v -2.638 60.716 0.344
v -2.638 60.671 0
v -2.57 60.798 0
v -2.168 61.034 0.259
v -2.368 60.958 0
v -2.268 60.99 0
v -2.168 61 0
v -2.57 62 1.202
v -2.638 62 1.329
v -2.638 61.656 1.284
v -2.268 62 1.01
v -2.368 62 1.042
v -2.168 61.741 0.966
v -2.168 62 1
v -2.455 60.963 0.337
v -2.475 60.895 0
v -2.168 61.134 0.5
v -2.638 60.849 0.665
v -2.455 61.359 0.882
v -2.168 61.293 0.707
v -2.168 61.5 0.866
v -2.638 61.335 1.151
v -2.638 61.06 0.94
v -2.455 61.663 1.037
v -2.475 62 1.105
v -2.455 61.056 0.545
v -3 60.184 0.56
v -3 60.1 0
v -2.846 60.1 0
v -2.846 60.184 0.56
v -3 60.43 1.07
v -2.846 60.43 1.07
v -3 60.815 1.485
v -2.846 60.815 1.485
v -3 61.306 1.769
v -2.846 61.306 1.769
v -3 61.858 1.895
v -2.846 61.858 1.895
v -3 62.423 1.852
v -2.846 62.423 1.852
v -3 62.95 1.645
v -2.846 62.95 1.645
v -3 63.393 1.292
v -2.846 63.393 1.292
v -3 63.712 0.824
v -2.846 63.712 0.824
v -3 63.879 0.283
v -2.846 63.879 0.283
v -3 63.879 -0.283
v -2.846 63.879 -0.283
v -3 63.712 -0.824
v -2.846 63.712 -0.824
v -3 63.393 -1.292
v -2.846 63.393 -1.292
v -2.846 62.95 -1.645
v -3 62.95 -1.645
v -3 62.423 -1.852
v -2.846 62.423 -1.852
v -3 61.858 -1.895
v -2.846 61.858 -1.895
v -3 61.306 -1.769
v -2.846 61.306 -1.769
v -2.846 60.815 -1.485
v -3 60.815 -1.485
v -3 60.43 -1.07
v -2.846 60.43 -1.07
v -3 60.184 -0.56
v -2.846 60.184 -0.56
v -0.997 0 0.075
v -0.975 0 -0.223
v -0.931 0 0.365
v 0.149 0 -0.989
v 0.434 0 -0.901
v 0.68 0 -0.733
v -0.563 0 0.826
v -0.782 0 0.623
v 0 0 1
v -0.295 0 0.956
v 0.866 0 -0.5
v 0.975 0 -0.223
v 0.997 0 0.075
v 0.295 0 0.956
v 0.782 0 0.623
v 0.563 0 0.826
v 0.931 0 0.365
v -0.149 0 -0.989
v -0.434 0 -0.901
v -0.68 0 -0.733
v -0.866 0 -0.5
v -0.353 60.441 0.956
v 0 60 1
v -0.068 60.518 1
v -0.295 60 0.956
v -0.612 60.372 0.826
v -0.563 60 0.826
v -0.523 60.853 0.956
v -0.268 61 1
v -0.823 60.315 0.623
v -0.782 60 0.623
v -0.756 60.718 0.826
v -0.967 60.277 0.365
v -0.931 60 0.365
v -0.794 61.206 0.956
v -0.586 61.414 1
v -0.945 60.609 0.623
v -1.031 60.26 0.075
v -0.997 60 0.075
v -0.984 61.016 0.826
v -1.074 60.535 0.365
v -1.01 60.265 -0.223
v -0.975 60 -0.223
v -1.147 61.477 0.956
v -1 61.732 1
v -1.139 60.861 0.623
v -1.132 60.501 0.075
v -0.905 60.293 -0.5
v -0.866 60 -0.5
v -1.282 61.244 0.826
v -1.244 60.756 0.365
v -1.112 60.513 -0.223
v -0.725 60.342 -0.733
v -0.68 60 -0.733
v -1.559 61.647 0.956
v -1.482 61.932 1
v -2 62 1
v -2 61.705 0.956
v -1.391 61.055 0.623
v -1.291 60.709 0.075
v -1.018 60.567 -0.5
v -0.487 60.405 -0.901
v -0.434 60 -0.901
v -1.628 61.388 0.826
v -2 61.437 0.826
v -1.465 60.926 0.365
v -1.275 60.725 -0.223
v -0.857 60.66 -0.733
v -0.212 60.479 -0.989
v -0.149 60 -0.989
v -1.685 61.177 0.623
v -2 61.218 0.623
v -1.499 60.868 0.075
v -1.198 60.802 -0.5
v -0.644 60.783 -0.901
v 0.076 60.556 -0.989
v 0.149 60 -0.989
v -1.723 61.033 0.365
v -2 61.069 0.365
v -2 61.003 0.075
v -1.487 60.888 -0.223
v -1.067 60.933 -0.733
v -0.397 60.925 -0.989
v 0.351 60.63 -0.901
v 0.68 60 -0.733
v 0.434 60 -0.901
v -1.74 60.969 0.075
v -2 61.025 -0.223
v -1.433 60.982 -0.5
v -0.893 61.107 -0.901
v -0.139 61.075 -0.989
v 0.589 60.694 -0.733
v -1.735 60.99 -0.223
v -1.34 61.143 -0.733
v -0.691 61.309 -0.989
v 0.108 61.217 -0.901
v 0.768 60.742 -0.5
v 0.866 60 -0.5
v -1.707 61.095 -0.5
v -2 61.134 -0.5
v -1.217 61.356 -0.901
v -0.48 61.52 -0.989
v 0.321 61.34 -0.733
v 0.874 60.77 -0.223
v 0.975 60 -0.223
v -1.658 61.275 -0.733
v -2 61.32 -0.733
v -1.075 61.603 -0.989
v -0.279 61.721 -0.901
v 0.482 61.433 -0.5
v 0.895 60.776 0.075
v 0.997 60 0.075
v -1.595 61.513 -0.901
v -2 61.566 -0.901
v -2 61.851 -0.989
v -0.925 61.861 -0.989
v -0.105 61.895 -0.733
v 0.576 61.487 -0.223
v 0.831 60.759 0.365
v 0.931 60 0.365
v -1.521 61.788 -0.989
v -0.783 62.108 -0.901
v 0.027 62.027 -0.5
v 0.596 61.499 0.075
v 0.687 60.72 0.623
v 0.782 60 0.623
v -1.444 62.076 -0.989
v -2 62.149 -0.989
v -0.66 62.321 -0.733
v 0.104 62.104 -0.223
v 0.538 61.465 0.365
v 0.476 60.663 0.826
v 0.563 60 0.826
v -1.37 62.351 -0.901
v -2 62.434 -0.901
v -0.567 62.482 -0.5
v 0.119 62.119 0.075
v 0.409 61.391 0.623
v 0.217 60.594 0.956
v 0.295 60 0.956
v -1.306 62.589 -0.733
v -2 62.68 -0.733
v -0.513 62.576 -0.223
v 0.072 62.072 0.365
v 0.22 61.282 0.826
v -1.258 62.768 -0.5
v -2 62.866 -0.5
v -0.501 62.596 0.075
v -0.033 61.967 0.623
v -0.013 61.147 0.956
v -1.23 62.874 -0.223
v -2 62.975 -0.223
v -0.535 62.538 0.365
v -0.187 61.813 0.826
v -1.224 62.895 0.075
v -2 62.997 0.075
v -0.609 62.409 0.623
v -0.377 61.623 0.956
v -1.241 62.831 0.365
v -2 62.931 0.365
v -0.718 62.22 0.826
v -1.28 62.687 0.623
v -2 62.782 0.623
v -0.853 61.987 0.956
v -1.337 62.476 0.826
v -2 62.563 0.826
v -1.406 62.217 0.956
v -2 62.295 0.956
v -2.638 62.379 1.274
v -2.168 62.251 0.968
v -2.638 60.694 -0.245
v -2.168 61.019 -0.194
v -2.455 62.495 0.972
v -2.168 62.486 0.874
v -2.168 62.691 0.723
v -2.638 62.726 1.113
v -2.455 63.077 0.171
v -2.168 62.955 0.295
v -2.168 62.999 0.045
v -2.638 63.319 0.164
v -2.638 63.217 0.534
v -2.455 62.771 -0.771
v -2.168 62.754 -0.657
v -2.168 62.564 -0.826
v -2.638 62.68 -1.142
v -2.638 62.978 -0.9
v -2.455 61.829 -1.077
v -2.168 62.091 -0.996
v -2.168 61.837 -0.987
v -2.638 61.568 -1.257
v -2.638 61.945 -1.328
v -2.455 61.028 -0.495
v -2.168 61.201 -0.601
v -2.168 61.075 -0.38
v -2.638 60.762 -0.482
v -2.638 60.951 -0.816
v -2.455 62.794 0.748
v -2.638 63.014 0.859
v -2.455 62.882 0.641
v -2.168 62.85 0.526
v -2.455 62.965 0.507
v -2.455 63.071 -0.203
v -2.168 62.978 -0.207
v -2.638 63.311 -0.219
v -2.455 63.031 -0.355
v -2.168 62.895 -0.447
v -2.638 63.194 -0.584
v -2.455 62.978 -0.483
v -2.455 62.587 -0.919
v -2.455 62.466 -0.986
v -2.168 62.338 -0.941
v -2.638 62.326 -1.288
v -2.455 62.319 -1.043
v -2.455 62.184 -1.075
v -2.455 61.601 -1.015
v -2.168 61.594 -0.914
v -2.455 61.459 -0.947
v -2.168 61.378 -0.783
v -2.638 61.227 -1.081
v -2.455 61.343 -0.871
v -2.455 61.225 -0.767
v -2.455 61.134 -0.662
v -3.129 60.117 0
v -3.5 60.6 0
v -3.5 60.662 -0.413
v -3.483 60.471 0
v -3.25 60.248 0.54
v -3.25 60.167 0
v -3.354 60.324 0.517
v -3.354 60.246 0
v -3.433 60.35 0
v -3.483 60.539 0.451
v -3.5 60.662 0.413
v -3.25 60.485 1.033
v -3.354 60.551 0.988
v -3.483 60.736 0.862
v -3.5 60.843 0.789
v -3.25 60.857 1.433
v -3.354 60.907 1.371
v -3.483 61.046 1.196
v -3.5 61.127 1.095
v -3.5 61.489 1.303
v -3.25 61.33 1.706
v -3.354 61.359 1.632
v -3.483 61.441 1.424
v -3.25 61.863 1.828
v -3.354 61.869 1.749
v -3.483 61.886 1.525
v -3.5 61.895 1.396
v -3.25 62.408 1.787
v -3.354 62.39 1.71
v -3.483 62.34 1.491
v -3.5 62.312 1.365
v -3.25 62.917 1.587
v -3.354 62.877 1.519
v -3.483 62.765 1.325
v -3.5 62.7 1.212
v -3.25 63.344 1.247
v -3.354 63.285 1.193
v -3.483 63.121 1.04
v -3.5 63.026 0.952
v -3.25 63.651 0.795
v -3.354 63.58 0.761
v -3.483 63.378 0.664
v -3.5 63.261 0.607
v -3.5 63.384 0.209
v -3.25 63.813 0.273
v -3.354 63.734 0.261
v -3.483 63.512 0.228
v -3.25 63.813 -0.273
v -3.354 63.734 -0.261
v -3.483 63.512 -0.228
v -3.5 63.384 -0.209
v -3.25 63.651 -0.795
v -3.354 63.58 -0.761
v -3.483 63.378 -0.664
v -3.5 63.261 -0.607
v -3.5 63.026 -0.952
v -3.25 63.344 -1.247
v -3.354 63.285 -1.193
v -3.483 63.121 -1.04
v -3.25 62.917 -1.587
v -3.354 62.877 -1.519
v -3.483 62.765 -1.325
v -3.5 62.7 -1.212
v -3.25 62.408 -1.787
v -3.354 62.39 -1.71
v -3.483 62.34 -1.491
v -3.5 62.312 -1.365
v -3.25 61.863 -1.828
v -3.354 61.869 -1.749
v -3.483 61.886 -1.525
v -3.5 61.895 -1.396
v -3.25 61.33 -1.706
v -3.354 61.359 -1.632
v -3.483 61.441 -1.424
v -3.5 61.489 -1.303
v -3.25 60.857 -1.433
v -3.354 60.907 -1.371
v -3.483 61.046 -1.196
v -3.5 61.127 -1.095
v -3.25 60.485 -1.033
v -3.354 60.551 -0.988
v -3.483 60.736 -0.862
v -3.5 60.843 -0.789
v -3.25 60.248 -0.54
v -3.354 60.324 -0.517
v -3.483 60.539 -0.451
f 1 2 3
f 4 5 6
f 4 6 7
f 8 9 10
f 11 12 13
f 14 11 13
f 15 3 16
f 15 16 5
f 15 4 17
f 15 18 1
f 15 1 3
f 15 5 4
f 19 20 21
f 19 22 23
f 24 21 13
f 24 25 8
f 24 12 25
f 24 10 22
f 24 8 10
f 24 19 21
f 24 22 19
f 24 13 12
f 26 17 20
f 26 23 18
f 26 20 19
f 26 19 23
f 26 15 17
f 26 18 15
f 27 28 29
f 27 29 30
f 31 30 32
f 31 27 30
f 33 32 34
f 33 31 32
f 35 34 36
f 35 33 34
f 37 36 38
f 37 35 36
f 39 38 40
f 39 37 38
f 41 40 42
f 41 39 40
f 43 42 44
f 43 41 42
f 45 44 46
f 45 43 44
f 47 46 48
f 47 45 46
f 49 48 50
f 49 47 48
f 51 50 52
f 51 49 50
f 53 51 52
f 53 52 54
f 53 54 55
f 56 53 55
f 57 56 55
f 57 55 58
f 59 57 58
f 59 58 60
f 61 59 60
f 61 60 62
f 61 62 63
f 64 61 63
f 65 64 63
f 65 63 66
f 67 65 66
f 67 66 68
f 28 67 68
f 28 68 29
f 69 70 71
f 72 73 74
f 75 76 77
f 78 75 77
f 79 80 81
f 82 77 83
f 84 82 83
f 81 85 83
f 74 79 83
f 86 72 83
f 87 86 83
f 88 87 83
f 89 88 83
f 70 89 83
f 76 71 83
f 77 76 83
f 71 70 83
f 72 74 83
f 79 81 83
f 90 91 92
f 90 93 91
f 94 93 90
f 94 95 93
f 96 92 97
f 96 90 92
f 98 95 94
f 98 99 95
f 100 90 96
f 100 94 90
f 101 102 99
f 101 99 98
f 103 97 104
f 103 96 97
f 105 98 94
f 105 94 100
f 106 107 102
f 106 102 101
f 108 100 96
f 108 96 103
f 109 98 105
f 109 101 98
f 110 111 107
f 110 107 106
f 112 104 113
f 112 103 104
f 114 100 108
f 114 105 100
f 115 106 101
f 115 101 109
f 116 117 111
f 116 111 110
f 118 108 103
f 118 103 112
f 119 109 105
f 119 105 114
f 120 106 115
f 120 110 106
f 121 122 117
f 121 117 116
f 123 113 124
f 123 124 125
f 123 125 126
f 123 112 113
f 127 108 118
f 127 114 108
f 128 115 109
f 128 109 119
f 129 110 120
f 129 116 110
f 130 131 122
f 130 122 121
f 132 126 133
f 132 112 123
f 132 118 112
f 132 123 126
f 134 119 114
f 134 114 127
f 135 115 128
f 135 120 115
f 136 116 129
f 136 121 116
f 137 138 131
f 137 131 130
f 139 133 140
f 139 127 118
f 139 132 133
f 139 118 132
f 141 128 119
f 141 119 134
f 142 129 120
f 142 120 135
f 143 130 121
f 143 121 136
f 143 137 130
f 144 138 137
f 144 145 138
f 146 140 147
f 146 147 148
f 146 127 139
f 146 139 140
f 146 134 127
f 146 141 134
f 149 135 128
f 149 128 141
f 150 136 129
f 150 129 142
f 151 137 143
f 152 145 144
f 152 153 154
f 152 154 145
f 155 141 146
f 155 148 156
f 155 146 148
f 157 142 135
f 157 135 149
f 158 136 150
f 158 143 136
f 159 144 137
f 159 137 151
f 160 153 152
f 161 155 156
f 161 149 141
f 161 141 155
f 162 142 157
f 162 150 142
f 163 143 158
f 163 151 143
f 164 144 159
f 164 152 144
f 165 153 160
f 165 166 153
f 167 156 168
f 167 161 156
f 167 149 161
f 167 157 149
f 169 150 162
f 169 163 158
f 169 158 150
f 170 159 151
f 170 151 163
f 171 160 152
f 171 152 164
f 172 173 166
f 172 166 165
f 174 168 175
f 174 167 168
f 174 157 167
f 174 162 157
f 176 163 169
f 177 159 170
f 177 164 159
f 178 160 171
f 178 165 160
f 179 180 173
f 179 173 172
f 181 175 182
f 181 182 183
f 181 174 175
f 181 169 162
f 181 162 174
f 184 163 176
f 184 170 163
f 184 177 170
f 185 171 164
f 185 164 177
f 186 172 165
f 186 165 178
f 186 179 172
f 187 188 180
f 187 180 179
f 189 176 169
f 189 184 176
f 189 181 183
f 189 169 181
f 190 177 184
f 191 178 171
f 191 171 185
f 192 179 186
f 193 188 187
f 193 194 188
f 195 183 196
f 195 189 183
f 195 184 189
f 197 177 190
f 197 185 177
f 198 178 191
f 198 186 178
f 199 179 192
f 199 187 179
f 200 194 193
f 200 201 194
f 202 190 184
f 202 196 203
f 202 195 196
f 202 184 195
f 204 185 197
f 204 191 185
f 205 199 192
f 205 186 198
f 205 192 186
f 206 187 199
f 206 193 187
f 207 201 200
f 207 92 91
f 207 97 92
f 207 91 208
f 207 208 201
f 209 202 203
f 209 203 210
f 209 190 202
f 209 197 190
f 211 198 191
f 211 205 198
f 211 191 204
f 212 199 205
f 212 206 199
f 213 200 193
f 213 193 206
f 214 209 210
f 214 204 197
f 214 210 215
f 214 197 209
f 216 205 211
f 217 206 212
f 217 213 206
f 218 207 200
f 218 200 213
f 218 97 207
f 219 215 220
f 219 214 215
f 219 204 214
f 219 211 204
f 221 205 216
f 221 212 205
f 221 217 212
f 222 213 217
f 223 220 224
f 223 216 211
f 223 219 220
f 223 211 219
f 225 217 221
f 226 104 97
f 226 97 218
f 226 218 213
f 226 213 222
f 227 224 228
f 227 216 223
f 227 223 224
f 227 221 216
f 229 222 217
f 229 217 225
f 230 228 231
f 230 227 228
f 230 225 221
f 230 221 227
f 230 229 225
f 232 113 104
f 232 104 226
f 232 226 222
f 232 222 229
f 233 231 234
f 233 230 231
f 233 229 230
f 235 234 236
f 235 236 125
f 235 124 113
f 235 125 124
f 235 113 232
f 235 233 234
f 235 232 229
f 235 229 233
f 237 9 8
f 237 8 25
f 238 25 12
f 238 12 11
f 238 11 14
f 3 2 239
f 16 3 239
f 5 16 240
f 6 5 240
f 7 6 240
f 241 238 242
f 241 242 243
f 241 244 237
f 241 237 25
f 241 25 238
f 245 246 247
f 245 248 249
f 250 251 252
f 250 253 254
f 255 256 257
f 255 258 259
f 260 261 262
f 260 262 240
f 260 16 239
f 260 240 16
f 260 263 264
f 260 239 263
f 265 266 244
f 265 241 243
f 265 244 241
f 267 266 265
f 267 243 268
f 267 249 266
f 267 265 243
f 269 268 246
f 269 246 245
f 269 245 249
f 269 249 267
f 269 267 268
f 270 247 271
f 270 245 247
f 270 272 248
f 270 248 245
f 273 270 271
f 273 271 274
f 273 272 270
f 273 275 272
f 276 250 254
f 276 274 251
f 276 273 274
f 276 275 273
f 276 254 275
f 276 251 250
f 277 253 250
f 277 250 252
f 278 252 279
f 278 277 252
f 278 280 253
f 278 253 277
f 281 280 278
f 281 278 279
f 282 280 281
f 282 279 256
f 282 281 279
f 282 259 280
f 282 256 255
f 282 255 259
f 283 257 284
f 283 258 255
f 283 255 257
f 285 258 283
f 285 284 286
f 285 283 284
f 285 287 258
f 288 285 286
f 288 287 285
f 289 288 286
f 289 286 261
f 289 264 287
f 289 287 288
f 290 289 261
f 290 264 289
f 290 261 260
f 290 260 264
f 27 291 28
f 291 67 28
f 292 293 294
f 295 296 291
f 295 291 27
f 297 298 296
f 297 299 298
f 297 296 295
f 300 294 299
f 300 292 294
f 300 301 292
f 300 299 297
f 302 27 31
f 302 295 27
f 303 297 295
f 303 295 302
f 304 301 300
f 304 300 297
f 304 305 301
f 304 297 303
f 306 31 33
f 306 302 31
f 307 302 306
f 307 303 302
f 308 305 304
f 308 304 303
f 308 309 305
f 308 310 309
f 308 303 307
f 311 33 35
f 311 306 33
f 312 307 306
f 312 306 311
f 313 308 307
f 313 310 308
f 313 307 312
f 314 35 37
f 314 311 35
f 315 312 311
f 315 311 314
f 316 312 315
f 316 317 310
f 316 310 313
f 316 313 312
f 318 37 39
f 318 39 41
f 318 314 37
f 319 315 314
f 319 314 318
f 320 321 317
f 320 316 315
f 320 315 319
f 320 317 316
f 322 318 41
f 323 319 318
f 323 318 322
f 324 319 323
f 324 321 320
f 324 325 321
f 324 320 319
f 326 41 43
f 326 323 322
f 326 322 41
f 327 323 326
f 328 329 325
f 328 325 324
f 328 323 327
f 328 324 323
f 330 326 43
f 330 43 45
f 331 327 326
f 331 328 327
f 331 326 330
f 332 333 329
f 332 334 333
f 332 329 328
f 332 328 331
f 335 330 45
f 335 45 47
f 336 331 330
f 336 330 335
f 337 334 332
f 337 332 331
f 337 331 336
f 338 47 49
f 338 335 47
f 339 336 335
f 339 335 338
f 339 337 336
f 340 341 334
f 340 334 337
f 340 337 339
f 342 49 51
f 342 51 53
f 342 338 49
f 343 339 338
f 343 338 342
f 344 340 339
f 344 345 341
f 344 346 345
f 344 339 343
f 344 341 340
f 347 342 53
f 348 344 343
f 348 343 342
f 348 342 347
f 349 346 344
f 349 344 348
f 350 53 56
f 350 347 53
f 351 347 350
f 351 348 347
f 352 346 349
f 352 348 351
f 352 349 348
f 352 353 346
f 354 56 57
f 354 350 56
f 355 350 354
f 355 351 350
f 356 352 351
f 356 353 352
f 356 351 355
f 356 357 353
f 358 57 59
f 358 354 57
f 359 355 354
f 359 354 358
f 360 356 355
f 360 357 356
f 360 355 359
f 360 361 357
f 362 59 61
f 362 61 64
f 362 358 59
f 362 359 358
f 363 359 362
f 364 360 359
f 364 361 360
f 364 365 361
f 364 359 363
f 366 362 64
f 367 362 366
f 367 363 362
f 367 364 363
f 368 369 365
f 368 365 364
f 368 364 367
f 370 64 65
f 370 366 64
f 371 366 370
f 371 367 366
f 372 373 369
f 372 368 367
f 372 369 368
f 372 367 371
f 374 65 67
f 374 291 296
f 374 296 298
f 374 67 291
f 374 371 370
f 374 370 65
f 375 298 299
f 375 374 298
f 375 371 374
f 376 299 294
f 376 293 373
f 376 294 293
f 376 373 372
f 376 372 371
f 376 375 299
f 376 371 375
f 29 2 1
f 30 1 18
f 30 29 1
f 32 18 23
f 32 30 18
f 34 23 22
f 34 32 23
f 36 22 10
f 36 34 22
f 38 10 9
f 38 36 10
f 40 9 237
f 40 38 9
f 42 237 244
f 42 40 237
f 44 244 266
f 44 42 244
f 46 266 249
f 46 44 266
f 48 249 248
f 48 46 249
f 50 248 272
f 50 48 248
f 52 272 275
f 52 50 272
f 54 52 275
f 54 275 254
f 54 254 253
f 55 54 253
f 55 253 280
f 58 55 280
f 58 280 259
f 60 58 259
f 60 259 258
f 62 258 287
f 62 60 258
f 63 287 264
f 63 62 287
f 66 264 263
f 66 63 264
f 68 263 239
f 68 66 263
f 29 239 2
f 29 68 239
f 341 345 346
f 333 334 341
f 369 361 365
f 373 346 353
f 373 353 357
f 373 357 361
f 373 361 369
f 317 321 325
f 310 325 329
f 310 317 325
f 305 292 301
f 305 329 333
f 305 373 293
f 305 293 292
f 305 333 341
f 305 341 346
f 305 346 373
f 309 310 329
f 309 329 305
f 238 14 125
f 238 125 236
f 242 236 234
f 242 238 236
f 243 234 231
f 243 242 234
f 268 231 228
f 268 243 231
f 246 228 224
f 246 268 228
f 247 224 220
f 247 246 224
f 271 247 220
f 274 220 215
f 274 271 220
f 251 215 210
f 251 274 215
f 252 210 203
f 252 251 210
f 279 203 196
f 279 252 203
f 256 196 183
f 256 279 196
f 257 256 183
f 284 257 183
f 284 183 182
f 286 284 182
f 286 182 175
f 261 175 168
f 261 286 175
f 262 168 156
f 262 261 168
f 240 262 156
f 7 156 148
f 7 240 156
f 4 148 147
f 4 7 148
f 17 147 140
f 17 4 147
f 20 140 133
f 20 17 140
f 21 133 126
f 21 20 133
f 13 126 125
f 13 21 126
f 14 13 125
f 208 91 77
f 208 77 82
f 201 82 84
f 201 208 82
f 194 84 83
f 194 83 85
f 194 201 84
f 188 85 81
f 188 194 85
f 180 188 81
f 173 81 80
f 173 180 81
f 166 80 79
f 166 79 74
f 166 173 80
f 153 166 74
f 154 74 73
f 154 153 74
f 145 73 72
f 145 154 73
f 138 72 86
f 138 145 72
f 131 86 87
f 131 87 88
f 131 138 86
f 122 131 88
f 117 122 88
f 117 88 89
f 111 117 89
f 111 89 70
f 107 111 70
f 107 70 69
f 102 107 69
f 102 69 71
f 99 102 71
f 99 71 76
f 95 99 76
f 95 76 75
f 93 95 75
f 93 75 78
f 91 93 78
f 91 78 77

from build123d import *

# Parameters (mm, degrees)
SWEEP1_PROFILE_R    = 1
SKETCH10_R          = 1.9
BOSS_EXTRUDE1_DEPTH = 1.2
CHAMFER1_SIZE       = 1.5
CHAMFER1_SIZE_2     = 0.545955351
FILLET1_R           = 0.5


with BuildPart() as part:
    # Sweep1: sweep along a path in Sketch1
    with BuildLine(Plane.XY) as sweep1_path:
        Line((0, 0), (0, 60))
        ThreePointArc((0, 60), (-0.585786438, 61.414213562), (-2, 62))
        Line((-2, 62), (-3.5, 62))
    # Sweep1 profile (on start of the path) → Sweep1 (sweep)
    with BuildSketch(Plane.ZX):
        Circle(SWEEP1_PROFILE_R)
    sweep(path=sweep1_path.line)

    # Sketch10 → Boss-Extrude1 (add)
    with BuildSketch(Plane.ZY.offset(3.5)):
        with Locations(Location((0, 62, 0), (0, 0, 270))):
            Circle(SKETCH10_R)
    extrude(amount=-BOSS_EXTRUDE1_DEPTH)

    # Chamfer1
    # the kernel refuses this chamfer: 1.5, 0.545955351 mm, written as the material it takes off along each edge
    with BuildSketch(Plane(origin=(-2.3, 62, 0), x_dir=(0, -1, 0), z_dir=(0, 0, -1))) as chamfer1_piece_1_section:
        Polygon((1.9 - CHAMFER1_SIZE, 0), (1.9, CHAMFER1_SIZE_2), (1.9, 0), align=None)
    chamfer1_piece_1 = revolve(axis=Axis((-2.3, 62, 0), (-1, 0, 0)), mode=Mode.PRIVATE)
    chamfer1_piece_1 = chamfer1_piece_1 - Plane(origin=(-2.677798348, 62, 0), x_dir=(0, 0, 1), z_dir=(-1, 0, 0)) * Cylinder(1, 8, mode=Mode.PRIVATE)
    add(chamfer1_piece_1, mode=Mode.SUBTRACT)

    # Fillet1
    fillet1_edges = [part.edges().sort_by_distance(p)[0] for p in [
        (-3.5, 63.9, 0),
        (-2.51838214, 61.292893219, 0.707106781),
    ]]
    fillet(fillet1_edges, radius=FILLET1_R)


solid = part.part
